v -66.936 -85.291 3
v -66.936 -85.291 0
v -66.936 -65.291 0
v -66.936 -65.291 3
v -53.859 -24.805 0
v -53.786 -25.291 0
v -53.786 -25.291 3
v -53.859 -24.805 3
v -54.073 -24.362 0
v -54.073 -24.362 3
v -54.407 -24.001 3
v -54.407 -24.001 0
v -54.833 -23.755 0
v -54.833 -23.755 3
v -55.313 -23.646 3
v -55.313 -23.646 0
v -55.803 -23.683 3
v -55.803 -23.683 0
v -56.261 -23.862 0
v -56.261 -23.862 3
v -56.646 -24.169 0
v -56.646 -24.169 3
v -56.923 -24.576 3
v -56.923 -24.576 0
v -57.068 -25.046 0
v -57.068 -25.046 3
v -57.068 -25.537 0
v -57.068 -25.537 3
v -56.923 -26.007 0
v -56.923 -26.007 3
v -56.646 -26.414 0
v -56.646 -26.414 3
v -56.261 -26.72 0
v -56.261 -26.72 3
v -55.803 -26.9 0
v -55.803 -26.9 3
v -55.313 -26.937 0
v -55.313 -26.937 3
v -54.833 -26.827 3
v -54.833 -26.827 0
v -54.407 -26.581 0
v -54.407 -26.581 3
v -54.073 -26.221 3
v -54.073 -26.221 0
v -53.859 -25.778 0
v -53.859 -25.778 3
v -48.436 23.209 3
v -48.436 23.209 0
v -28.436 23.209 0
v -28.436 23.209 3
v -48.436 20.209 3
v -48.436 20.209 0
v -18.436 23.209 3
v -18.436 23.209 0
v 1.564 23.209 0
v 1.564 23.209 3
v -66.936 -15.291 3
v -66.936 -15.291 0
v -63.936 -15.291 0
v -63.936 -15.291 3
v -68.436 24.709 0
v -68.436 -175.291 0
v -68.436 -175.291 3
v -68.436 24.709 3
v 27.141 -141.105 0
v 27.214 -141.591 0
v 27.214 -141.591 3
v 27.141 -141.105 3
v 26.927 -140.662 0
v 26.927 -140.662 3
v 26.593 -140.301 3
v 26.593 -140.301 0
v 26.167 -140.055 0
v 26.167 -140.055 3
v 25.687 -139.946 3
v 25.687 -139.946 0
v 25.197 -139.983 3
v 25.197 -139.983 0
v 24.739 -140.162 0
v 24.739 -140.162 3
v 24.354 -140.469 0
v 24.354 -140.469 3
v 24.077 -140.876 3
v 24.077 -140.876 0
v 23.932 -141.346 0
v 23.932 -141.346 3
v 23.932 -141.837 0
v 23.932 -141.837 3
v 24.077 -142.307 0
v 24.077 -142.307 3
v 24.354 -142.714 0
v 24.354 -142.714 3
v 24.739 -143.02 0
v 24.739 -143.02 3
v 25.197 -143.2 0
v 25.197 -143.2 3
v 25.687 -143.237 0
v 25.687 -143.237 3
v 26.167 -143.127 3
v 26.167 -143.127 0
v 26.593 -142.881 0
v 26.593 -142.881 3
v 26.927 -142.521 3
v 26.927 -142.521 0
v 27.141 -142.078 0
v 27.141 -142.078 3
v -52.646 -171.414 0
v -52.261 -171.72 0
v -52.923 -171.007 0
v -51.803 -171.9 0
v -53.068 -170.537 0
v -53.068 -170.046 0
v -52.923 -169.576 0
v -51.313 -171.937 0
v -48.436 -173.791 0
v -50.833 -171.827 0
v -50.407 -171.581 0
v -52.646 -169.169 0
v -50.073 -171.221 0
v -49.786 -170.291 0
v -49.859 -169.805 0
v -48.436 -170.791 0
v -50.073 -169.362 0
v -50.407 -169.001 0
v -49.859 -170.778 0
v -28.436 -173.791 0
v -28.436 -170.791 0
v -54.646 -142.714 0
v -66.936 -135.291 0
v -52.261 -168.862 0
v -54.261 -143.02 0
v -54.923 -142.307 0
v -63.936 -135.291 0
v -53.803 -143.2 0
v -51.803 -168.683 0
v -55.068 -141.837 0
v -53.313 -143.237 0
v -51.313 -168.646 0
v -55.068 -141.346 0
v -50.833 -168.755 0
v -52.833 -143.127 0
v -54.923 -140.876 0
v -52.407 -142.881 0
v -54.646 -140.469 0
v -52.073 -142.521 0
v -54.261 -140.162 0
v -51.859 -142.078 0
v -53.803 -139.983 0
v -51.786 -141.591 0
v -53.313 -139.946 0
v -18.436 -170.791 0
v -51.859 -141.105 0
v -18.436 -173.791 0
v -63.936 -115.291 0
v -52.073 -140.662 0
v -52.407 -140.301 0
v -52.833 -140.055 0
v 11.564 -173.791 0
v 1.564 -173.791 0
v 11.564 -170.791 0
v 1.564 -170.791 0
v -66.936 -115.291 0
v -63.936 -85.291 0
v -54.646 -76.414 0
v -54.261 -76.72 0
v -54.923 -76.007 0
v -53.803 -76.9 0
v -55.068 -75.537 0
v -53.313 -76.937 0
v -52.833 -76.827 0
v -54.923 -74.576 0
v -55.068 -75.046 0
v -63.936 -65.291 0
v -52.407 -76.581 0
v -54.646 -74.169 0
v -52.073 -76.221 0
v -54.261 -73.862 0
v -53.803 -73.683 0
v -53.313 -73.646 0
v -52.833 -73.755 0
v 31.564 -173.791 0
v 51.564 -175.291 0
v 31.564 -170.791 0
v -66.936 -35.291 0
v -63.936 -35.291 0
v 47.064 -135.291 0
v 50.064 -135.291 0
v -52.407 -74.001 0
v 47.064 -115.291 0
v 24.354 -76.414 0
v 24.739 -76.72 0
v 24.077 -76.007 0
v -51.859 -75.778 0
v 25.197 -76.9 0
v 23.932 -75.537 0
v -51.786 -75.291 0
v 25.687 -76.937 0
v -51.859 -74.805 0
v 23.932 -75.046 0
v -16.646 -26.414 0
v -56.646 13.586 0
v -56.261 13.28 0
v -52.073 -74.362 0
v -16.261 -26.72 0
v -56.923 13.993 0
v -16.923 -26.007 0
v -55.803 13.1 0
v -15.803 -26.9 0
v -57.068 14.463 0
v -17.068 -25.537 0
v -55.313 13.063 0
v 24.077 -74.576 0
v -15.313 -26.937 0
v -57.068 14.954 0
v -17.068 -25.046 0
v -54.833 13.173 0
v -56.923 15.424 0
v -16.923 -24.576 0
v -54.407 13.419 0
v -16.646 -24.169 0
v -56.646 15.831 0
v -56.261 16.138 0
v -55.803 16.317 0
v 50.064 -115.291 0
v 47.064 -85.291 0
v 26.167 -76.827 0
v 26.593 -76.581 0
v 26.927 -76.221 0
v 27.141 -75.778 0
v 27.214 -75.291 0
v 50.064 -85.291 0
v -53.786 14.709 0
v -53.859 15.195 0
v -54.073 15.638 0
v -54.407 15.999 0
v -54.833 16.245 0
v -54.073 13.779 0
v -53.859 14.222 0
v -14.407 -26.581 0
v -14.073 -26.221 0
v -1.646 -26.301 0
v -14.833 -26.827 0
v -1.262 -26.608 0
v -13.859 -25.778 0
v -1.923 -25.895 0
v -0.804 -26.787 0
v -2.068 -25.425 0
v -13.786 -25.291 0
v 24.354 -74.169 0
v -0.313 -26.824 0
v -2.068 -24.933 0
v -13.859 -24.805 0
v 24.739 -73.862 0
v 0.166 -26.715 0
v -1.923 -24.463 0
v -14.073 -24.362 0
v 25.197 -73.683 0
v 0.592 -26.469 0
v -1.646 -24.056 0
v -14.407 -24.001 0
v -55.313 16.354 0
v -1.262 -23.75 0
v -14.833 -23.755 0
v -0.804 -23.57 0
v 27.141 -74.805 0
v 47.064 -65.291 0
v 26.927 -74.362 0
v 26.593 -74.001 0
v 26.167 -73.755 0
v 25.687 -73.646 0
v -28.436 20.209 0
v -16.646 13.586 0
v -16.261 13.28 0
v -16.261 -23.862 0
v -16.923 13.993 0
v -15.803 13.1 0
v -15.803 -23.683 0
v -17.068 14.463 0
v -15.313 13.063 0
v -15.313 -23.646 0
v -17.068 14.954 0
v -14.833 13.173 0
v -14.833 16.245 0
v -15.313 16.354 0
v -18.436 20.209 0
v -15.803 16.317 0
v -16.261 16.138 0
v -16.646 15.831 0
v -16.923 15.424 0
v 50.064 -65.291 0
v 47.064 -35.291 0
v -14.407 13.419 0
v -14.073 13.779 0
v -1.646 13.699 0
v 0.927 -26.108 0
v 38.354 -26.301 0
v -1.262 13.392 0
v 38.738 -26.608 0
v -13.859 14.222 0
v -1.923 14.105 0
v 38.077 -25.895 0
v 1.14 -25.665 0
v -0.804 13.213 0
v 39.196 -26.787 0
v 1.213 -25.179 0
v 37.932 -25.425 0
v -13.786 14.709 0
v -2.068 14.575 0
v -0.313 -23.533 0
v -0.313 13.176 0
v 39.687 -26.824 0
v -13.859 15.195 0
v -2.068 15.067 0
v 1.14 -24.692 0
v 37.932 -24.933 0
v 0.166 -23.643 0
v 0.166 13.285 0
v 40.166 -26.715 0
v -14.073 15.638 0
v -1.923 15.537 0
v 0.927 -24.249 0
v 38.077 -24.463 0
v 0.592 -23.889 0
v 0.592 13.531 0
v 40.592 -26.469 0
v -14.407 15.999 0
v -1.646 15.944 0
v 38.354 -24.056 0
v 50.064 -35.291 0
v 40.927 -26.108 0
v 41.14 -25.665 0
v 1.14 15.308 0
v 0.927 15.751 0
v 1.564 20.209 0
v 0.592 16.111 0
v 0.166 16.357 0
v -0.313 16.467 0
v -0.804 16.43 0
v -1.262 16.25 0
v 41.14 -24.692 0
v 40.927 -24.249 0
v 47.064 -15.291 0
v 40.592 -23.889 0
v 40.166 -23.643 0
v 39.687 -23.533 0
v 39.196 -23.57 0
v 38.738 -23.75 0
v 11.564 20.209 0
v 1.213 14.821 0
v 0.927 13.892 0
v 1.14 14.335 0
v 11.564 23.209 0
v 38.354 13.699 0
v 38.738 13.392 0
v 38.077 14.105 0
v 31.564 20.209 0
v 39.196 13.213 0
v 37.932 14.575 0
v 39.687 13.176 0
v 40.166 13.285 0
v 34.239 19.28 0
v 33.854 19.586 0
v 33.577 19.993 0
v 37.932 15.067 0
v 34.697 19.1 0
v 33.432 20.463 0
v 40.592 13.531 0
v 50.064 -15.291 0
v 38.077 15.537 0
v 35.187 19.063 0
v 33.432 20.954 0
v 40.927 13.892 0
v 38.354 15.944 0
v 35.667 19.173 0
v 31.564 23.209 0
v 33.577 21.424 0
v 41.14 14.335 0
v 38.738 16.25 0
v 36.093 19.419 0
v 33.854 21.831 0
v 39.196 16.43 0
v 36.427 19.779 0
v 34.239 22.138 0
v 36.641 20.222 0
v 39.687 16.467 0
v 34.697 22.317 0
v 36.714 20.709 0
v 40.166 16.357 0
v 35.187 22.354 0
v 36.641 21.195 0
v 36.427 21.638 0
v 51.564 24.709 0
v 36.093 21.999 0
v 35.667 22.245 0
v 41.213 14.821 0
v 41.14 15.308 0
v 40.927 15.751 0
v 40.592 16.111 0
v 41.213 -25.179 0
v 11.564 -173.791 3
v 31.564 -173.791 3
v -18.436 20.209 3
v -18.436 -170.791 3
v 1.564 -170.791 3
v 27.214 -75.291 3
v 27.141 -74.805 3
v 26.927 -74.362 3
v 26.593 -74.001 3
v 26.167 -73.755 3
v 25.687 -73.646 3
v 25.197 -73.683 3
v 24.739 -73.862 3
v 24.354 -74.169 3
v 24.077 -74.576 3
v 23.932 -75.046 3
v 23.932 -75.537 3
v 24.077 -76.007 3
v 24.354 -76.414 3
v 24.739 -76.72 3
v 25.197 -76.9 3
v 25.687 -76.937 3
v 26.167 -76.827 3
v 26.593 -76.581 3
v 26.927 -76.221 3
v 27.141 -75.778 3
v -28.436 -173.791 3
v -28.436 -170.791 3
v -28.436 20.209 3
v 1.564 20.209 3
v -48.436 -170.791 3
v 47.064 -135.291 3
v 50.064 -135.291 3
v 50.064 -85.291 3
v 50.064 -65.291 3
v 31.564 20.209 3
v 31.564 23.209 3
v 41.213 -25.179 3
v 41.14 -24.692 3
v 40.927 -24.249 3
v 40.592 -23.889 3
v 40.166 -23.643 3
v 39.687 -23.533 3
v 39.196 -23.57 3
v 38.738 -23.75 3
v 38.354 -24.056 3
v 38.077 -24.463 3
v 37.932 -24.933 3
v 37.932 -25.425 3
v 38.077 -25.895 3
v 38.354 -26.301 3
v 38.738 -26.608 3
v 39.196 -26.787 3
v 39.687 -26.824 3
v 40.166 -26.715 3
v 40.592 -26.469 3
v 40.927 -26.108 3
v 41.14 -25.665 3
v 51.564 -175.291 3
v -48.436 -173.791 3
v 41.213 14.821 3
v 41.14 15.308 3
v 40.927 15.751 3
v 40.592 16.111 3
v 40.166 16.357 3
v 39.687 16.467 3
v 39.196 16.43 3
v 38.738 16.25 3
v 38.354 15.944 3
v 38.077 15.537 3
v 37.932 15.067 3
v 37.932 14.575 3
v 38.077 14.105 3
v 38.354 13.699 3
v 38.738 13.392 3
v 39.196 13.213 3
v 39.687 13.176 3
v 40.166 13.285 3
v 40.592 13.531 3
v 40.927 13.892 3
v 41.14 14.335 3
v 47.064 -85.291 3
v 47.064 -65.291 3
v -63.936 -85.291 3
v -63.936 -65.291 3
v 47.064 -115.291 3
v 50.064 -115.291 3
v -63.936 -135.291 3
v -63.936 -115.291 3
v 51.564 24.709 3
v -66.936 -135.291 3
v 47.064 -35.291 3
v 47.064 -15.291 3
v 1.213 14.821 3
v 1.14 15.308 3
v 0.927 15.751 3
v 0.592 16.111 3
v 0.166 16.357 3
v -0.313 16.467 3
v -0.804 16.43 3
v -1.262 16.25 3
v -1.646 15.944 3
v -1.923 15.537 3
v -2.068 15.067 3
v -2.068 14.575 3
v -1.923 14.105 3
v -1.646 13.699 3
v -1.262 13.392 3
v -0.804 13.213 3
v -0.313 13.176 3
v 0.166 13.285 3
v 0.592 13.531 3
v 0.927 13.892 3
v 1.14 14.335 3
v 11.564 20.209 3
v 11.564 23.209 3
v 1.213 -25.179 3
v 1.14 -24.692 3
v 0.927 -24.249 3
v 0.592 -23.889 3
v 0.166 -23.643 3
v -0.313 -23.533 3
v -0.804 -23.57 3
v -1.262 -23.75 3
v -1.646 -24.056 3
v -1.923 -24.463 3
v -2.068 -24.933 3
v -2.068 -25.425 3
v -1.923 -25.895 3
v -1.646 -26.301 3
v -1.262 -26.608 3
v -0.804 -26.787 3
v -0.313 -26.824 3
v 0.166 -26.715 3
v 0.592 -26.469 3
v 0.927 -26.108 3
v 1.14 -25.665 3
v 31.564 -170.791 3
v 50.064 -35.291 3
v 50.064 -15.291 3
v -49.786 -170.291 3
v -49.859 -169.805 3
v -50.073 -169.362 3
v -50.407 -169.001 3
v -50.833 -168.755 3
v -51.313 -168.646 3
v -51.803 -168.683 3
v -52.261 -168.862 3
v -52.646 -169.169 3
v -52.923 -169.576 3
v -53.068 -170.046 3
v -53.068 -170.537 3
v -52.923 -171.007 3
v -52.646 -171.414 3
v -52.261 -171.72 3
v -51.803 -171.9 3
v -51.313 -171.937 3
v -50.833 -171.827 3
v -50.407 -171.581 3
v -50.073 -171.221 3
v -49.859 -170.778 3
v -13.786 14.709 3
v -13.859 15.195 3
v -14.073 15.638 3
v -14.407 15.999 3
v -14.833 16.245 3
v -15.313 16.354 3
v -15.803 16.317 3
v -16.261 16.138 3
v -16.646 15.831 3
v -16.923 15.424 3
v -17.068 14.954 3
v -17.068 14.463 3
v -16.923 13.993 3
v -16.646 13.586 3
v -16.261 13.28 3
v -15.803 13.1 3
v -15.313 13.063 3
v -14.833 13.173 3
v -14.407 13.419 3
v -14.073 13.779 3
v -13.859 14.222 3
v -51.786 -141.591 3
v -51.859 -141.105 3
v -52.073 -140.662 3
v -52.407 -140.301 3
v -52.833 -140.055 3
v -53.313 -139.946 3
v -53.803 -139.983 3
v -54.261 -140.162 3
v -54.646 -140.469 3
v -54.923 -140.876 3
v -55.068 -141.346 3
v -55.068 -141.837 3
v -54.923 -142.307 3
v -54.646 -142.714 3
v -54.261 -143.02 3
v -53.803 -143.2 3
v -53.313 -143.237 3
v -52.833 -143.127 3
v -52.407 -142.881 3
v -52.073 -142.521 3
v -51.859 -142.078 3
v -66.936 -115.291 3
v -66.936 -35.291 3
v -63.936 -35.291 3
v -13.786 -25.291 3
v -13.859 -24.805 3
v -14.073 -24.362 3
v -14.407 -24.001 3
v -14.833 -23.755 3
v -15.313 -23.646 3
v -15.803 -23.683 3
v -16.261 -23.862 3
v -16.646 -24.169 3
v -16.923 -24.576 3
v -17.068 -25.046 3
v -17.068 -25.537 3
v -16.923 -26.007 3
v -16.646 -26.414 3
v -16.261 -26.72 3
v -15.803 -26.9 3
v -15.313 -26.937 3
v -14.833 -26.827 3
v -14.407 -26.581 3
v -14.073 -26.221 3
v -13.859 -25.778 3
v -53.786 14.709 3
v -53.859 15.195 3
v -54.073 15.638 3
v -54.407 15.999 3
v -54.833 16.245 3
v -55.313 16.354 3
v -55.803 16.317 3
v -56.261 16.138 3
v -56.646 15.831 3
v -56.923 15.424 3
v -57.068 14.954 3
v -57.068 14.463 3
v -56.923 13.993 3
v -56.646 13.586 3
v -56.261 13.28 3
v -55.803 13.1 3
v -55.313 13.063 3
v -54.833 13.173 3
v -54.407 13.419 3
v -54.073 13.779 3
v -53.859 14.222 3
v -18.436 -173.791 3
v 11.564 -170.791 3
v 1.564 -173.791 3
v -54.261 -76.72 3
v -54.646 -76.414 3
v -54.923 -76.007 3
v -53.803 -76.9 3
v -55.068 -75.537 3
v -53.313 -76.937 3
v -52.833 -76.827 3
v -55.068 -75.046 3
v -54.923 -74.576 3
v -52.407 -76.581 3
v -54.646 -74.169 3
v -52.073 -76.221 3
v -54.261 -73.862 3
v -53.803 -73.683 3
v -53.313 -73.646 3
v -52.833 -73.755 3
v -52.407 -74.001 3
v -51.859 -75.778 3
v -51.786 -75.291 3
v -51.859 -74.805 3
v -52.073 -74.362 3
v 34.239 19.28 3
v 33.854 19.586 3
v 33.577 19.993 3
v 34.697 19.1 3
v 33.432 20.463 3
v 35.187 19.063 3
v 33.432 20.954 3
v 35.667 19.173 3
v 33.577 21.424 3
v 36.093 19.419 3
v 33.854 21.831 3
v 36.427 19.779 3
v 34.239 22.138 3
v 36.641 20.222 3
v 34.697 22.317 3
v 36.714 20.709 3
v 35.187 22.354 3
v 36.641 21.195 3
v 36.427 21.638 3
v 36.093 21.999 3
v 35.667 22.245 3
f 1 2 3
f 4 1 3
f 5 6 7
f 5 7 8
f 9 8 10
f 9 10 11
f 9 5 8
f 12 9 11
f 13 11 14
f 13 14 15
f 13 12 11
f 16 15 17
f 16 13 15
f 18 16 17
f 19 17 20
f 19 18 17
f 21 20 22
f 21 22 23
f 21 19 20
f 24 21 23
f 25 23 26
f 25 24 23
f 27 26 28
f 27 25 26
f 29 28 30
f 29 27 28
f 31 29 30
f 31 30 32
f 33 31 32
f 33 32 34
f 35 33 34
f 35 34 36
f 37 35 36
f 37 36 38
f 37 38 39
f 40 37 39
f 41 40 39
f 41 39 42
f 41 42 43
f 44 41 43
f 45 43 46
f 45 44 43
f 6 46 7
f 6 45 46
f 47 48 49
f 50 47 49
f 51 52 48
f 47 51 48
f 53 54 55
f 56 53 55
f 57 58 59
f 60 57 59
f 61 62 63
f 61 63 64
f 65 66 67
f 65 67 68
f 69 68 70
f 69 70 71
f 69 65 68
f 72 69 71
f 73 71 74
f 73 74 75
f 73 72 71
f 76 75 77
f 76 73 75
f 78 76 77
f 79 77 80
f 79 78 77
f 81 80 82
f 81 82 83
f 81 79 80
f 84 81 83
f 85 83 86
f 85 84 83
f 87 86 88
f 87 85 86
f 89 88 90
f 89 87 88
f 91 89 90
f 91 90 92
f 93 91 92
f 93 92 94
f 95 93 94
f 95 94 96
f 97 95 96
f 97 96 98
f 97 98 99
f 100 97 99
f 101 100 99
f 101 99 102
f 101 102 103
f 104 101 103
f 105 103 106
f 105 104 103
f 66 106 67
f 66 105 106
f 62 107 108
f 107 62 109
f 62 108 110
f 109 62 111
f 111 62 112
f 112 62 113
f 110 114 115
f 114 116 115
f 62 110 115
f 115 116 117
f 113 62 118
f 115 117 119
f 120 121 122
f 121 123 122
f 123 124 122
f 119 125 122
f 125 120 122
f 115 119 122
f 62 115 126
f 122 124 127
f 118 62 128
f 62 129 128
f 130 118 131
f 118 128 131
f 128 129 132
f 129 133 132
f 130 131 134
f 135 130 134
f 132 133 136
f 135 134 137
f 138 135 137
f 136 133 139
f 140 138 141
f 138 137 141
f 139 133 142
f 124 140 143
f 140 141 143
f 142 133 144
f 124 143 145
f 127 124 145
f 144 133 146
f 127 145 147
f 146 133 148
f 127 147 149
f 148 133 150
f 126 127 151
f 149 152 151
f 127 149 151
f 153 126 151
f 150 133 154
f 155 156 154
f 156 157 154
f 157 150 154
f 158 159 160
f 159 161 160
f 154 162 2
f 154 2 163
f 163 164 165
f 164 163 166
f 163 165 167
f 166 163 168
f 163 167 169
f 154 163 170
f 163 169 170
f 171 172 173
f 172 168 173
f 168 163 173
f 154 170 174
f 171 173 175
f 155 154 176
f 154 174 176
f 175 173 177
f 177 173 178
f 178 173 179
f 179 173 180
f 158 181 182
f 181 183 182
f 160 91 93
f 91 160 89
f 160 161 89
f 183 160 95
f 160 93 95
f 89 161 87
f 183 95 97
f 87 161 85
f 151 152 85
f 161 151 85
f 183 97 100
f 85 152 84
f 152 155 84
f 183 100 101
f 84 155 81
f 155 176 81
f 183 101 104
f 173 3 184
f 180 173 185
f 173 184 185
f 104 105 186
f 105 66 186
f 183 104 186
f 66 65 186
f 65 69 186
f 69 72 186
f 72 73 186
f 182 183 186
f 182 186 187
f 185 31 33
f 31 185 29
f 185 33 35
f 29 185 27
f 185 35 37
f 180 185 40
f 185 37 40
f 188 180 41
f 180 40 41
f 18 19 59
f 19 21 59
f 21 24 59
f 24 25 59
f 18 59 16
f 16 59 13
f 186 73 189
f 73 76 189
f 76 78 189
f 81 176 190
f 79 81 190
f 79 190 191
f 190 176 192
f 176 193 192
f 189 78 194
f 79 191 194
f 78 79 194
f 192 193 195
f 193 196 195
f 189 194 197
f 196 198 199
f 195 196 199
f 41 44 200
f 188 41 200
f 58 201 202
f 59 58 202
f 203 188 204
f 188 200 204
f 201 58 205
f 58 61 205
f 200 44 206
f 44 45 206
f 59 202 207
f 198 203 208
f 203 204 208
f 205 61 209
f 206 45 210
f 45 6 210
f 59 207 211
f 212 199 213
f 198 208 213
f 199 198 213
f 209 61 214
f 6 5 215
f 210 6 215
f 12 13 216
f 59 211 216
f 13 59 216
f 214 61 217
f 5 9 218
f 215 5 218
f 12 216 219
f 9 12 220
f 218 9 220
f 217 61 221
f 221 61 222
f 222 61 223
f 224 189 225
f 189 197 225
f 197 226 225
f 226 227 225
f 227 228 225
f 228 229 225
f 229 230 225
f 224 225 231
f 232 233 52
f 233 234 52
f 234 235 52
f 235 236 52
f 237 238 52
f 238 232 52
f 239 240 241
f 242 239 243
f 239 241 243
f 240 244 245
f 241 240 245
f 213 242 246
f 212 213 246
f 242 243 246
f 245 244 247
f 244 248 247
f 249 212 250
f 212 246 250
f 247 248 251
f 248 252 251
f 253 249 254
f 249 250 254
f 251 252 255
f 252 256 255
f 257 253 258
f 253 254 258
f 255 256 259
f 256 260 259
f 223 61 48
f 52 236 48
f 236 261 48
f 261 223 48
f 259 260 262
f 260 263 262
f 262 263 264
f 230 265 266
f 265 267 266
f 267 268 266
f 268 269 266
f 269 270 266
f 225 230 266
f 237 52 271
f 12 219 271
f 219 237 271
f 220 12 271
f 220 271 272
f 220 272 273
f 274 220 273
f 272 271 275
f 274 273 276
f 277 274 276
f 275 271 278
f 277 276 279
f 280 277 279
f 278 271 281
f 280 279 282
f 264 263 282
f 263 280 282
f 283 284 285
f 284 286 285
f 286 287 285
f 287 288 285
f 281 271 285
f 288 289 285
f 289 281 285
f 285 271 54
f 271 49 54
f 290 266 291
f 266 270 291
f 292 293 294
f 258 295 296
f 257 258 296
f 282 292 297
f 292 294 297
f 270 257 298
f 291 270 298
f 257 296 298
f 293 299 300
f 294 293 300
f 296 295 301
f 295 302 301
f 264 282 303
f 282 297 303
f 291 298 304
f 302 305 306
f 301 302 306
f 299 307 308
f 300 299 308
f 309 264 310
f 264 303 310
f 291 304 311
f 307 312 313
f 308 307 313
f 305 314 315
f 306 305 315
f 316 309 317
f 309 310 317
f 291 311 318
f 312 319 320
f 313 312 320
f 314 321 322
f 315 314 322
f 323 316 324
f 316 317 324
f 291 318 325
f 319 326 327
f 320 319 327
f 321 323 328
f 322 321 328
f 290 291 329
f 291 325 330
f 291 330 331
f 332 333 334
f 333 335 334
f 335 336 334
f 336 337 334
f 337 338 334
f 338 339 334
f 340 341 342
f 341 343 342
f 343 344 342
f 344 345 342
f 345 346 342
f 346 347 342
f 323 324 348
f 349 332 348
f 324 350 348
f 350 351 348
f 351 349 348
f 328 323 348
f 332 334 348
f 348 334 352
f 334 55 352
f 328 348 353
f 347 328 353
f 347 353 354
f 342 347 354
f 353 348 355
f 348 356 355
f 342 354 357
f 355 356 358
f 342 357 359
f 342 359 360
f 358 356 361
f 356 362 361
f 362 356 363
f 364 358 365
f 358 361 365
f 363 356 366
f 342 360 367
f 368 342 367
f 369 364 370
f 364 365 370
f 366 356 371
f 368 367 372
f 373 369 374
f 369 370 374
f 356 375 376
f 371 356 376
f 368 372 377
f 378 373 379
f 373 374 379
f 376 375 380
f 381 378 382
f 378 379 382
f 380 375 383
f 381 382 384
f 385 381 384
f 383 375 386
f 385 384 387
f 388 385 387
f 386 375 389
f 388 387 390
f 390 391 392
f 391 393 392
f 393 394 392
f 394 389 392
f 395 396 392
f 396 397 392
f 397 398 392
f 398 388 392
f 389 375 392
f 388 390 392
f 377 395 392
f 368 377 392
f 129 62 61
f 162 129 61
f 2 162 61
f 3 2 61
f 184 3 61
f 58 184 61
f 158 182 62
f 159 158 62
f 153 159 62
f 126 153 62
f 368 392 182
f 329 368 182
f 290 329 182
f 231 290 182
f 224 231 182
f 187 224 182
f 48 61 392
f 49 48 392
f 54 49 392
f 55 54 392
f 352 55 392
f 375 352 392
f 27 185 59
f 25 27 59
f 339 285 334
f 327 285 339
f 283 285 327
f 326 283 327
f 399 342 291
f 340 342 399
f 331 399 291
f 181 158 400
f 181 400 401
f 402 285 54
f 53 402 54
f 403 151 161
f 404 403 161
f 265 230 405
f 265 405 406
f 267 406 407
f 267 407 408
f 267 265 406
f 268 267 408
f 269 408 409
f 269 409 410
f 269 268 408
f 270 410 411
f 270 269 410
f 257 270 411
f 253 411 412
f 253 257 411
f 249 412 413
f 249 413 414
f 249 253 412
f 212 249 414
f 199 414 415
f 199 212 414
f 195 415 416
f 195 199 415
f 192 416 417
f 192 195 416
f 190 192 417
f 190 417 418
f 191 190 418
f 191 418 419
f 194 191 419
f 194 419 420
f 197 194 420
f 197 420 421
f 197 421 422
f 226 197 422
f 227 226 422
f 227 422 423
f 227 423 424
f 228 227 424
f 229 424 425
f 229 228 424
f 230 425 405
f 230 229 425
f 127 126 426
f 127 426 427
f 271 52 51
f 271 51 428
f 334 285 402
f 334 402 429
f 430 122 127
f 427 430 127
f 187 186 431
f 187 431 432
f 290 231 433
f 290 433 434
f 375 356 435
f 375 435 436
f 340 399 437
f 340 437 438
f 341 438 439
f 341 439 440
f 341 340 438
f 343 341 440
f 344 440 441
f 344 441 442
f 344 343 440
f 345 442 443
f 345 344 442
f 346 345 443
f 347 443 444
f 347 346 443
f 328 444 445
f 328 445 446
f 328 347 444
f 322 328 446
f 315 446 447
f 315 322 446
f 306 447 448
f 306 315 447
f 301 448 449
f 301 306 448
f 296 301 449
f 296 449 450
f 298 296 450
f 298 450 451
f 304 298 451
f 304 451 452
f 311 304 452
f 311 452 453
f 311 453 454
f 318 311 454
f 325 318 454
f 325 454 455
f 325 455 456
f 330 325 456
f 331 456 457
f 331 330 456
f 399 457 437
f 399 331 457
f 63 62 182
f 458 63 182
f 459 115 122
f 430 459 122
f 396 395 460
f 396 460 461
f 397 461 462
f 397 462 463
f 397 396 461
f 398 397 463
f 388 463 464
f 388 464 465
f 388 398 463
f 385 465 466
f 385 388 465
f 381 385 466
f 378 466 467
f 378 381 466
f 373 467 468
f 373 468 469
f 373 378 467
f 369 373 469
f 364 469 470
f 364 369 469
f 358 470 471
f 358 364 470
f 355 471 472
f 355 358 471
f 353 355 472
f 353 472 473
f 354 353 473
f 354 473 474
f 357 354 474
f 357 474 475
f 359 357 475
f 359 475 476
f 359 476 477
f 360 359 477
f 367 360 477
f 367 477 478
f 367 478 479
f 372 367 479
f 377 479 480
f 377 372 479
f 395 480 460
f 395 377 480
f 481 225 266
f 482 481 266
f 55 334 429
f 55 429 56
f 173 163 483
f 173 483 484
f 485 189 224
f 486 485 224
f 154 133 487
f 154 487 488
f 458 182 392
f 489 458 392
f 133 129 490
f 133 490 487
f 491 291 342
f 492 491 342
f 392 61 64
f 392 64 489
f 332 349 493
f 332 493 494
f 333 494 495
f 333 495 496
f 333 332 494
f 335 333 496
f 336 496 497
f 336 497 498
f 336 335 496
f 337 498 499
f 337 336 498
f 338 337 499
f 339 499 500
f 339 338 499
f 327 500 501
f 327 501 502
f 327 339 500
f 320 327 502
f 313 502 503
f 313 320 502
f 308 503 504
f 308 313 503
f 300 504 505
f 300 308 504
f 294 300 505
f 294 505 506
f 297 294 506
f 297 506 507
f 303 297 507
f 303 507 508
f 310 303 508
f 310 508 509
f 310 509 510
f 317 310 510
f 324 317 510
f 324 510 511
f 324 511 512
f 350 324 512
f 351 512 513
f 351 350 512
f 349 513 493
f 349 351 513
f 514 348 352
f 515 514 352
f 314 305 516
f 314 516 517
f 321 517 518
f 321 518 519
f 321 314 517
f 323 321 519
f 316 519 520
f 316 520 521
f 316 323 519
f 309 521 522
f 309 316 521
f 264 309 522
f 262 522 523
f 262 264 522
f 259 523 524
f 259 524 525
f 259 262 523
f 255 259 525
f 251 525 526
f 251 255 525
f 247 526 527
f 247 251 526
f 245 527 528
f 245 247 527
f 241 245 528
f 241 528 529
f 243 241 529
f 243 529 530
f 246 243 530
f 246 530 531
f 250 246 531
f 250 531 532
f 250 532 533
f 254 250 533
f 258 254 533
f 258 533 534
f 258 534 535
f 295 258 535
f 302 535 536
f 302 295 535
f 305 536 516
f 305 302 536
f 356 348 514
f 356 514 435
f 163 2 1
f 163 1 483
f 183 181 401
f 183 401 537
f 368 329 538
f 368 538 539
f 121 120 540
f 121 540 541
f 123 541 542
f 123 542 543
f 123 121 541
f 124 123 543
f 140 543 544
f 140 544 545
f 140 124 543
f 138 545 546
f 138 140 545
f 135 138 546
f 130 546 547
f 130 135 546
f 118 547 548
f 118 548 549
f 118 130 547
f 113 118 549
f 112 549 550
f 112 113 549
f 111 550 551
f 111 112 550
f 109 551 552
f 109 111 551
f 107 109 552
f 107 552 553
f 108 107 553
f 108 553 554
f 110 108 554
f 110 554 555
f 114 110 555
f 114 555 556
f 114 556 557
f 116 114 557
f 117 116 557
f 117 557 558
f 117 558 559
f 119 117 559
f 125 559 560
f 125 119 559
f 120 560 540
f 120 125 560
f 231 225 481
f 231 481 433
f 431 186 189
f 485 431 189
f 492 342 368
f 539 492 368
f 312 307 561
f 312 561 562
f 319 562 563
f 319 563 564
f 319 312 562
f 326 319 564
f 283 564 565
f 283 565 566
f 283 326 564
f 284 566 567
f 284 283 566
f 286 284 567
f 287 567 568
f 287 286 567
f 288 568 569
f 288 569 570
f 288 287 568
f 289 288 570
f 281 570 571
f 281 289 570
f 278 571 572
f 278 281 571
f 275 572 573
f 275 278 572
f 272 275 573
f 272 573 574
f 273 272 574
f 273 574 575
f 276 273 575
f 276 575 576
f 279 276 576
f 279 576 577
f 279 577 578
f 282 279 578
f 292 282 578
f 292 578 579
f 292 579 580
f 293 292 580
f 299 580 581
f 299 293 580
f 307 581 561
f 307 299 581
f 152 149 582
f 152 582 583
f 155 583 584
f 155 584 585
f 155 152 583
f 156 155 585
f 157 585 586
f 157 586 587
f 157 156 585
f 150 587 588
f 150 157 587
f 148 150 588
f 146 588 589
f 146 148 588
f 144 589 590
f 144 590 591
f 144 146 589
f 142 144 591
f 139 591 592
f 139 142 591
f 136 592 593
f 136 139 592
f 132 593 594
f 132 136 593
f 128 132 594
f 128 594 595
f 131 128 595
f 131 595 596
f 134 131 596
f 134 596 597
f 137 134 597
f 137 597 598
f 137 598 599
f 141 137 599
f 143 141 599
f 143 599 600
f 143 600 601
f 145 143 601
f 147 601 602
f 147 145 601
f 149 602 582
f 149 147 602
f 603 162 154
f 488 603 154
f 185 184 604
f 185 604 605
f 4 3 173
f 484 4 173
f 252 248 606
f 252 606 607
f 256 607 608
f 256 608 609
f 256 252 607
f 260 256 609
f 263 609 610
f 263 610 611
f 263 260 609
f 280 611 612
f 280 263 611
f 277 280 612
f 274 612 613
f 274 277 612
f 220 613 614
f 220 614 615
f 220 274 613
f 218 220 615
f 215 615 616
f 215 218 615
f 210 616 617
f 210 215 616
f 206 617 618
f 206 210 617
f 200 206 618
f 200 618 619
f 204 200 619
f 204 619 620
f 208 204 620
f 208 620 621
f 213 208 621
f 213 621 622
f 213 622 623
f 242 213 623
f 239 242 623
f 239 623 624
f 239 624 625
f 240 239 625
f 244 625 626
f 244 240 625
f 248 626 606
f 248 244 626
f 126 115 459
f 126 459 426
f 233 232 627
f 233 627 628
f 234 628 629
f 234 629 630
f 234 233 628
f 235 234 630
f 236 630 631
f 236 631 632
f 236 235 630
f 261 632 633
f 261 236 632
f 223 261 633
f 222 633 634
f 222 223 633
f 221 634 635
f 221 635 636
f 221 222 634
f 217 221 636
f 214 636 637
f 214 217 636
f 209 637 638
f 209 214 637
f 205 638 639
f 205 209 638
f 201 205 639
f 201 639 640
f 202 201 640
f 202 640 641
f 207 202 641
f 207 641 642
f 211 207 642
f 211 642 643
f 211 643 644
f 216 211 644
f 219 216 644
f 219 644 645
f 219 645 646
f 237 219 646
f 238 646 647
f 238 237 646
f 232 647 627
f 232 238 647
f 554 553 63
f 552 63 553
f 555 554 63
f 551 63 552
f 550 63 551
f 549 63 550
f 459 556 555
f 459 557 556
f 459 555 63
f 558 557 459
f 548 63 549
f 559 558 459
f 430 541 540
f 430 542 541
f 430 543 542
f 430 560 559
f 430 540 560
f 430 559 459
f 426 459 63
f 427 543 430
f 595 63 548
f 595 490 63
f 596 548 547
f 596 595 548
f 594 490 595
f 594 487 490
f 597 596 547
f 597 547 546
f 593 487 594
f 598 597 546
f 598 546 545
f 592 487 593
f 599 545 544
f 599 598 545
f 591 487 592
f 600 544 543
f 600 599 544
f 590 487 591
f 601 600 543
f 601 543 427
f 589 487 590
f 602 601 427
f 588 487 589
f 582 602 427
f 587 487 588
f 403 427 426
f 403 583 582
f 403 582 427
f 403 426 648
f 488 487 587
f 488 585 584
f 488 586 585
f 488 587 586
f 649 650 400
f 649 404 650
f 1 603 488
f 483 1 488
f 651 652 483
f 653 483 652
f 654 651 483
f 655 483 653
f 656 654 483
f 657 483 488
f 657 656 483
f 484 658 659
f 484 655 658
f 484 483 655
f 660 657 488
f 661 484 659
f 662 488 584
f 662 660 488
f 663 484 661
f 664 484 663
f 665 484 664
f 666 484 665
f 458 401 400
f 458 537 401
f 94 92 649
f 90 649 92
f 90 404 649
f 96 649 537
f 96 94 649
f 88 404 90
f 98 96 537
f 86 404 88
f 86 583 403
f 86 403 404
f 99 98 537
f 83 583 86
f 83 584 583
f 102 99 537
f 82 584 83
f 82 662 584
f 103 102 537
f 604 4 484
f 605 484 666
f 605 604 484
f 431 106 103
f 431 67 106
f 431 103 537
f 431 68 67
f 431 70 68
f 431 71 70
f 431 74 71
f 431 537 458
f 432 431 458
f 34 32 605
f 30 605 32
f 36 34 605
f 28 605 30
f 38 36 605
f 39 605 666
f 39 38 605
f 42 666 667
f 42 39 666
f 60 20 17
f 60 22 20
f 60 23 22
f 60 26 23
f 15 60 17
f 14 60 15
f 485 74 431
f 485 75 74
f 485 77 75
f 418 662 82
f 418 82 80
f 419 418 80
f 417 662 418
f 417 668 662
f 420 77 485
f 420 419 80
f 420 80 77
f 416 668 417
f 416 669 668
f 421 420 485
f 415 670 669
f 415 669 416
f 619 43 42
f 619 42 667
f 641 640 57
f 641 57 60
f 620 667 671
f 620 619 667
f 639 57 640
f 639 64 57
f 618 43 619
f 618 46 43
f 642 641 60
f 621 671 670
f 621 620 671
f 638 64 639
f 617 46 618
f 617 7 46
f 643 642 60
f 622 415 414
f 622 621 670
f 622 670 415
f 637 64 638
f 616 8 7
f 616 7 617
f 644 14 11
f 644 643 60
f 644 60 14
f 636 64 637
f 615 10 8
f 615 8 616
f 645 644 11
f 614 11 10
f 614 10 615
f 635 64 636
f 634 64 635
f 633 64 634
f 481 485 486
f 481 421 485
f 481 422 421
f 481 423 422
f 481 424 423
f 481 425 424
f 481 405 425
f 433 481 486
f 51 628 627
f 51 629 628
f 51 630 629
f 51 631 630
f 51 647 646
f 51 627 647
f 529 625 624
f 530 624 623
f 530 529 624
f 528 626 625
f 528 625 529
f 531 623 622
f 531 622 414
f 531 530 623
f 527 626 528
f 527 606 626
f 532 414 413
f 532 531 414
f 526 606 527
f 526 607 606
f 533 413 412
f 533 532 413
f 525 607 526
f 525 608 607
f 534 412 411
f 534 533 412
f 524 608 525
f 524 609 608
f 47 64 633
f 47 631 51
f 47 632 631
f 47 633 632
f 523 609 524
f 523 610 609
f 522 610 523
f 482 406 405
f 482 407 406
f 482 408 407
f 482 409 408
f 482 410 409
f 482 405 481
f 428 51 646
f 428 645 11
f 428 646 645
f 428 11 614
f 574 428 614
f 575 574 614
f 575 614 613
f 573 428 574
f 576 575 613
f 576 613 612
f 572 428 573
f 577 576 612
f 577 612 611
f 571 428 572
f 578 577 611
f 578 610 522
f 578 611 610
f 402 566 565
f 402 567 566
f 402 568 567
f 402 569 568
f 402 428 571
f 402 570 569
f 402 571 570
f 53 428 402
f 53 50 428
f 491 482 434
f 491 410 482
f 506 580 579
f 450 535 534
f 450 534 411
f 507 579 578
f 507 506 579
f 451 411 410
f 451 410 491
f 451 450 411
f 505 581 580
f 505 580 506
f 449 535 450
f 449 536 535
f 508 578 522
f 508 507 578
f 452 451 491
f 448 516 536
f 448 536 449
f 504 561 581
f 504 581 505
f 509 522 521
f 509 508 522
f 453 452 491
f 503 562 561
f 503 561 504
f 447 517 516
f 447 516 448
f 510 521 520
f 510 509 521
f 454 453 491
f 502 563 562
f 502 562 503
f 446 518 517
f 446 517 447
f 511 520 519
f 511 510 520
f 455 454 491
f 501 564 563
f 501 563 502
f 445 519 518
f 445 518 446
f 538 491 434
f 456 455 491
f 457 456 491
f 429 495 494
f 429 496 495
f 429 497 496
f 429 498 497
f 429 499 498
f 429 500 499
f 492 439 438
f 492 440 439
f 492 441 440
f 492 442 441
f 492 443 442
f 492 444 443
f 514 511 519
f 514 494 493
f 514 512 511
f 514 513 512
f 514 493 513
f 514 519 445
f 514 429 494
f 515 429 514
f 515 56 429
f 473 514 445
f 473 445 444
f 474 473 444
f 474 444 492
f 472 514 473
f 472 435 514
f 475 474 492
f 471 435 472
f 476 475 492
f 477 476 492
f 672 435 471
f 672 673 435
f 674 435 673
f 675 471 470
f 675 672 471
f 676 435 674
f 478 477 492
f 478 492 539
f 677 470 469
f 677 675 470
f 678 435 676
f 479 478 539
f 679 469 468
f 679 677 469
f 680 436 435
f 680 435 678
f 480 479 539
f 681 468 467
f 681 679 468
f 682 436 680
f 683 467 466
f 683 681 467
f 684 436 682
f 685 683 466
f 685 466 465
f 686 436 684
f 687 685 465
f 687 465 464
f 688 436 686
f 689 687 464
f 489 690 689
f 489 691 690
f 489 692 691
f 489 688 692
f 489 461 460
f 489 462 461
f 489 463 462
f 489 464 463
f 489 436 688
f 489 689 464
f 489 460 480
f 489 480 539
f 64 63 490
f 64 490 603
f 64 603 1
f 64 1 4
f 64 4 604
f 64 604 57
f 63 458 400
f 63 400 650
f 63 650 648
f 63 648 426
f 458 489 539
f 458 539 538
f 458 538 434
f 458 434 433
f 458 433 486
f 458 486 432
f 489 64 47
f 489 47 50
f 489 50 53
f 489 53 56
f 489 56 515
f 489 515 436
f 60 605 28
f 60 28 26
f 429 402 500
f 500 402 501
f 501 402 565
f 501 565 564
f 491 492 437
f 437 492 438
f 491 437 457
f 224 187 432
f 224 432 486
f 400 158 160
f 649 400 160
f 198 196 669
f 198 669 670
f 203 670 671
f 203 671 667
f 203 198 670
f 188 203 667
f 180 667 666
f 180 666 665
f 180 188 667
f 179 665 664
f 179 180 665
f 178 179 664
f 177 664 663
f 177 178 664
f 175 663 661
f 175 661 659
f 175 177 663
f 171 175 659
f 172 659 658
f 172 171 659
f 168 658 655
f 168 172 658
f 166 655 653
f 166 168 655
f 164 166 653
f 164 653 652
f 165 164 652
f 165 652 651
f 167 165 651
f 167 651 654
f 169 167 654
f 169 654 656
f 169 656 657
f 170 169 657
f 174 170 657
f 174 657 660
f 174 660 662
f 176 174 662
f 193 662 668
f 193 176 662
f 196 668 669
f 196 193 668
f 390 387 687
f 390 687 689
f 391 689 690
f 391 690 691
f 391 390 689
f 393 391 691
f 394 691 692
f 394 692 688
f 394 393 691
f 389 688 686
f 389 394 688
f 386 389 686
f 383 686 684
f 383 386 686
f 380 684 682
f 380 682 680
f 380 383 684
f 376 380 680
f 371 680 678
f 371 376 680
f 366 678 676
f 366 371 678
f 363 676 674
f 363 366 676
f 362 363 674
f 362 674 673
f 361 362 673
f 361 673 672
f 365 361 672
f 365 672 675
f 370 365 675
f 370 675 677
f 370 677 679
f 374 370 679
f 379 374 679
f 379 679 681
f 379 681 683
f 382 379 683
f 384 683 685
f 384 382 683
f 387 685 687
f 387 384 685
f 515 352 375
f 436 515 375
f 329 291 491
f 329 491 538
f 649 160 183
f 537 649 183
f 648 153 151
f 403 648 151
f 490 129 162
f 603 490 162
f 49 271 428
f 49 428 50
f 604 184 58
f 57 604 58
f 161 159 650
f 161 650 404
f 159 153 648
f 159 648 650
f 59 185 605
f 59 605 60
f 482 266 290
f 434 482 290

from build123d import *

# Parameters (mm, degrees)
SKETCH1_W           = 120
SKETCH1_H           = 200
SKETCH1_R           = 1.65
SKETCH1_W_2         = 3
SKETCH1_H_2         = 20
SKETCH1_W_3         = 20
SKETCH1_H_3         = 3
BOSS_EXTRUDE1_DEPTH = 3


with BuildPart() as part:
    # Sketch1 → Boss-Extrude1 (new body)
    with BuildSketch(Plane.XY):
        with Locations((-8.436124494, -75.291436911)):
            Rectangle(SKETCH1_W, SKETCH1_H)
        with Locations((-55.436124494, 14.708563089)):
            Circle(SKETCH1_R, mode=Mode.SUBTRACT)
        with Locations((-15.436124494, 14.708563089)):
            Circle(SKETCH1_R, mode=Mode.SUBTRACT)
        with Locations((-15.436124494, -25.291436911)):
            Circle(SKETCH1_R, mode=Mode.SUBTRACT)
        with Locations((-55.436124494, -25.291436911)):
            Circle(SKETCH1_R, mode=Mode.SUBTRACT)
        with Locations((-0.436547566, 14.821221739)):
            Circle(SKETCH1_R, mode=Mode.SUBTRACT)
        with Locations((39.563452434, 14.821221739)):
            Circle(SKETCH1_R, mode=Mode.SUBTRACT)
        with Locations((39.563452434, -25.178778261)):
            Circle(SKETCH1_R, mode=Mode.SUBTRACT)
        with Locations((-0.436547566, -25.178778261)):
            Circle(SKETCH1_R, mode=Mode.SUBTRACT)
        with Locations((-53.436124494, -75.291436911)):
            Circle(SKETCH1_R, mode=Mode.SUBTRACT)
        with Locations((25.563875506, -75.291436911)):
            Circle(SKETCH1_R, mode=Mode.SUBTRACT)
        with Locations((25.563875506, -141.591436911)):
            Circle(SKETCH1_R, mode=Mode.SUBTRACT)
        with Locations((-53.436124494, -141.591436911)):
            Circle(SKETCH1_R, mode=Mode.SUBTRACT)
        with Locations((-51.436124494, -170.291436911)):
            Circle(SKETCH1_R, mode=Mode.SUBTRACT)
        with Locations((35.063875506, 20.708563089)):
            Circle(SKETCH1_R, mode=Mode.SUBTRACT)
        with Locations((-65.436124494, -25.291436911)):
            Rectangle(SKETCH1_W_2, SKETCH1_H_2, mode=Mode.SUBTRACT)
        with Locations((-65.436124494, -75.291436911)):
            Rectangle(SKETCH1_W_2, SKETCH1_H_2, mode=Mode.SUBTRACT)
        with Locations((-65.436124494, -125.291436911)):
            Rectangle(SKETCH1_W_2, SKETCH1_H_2, mode=Mode.SUBTRACT)
        with Locations((48.563875506, -25.291436911)):
            Rectangle(SKETCH1_W_2, SKETCH1_H_2, mode=Mode.SUBTRACT)
        with Locations((48.563875506, -75.291436911)):
            Rectangle(SKETCH1_W_2, SKETCH1_H_2, mode=Mode.SUBTRACT)
        with Locations((48.563875506, -125.291436911)):
            Rectangle(SKETCH1_W_2, SKETCH1_H_2, mode=Mode.SUBTRACT)
        with Locations((-38.436124494, -172.291436911)):
            Rectangle(SKETCH1_W_3, SKETCH1_H_3, mode=Mode.SUBTRACT)
        with Locations((-8.436124494, -172.291436911)):
            Rectangle(SKETCH1_W_3, SKETCH1_H_3, mode=Mode.SUBTRACT)
        with Locations((21.563875506, -172.291436911)):
            Rectangle(SKETCH1_W_3, SKETCH1_H_3, mode=Mode.SUBTRACT)
        with Locations((-38.436124494, 21.708563089)):
            Rectangle(SKETCH1_W_3, SKETCH1_H_3, mode=Mode.SUBTRACT)
        with Locations((-8.436124494, 21.708563089)):
            Rectangle(SKETCH1_W_3, SKETCH1_H_3, mode=Mode.SUBTRACT)
        with Locations((21.563875506, 21.708563089)):
            Rectangle(SKETCH1_W_3, SKETCH1_H_3, mode=Mode.SUBTRACT)
    extrude(amount=BOSS_EXTRUDE1_DEPTH)


solid = part.part
